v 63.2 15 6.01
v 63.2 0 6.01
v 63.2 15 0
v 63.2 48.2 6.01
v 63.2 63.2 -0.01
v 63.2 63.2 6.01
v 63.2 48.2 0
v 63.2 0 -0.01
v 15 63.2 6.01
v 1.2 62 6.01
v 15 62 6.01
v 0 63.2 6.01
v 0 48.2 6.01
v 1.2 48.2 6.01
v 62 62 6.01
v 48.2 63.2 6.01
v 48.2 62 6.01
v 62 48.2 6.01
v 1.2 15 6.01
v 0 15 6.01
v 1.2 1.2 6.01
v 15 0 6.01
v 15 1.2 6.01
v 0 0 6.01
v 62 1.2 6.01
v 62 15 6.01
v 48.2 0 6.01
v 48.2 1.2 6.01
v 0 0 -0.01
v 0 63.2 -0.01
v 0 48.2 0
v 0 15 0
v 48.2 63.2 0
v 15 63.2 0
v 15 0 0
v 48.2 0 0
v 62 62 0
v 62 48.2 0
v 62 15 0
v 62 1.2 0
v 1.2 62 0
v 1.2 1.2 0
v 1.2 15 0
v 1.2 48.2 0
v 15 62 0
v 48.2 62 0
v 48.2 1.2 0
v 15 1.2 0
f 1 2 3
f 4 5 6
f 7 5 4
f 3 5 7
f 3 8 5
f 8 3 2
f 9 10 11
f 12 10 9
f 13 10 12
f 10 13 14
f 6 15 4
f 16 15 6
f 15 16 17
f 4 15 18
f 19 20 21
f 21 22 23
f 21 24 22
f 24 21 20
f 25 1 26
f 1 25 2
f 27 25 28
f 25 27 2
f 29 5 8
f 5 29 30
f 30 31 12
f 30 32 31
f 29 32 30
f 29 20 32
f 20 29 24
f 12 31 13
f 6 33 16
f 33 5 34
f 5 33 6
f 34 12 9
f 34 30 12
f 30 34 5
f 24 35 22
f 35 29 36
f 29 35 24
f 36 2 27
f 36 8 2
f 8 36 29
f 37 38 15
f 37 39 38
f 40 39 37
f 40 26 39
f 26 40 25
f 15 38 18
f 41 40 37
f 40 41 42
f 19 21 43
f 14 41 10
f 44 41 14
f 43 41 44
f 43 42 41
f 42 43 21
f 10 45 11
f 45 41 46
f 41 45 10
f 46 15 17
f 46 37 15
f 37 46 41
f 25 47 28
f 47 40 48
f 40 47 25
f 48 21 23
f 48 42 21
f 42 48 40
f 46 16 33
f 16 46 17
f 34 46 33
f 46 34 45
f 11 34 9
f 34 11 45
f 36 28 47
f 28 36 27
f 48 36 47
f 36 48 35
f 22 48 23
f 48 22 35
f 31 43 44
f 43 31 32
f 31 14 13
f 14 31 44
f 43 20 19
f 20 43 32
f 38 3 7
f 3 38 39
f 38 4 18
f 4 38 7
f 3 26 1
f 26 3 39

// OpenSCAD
// file: ../Base/Rotation.scad
// Fischertechnik Box Foundation
// Geometry Helpers Rotation

include <PlacementOptions.scad>

// getRotatedSpace(space, rotation=NoRotation)
// Rotates the space dependent on the specified rotation

function getRotatedSpace(space, rotation=NoRotation) = [
    (rotation == Rotate90 || rotation == Rotate270) ? space.y : space.x,
    (rotation == Rotate90 || rotation == Rotate270) ? space.x : space.y
];

// Rotates the given space around the fixed left lower corner
// space = the space the children needs as width/depth list [width,depth]
// rotation = 0 Rotate0 degrees, 1 Rotate90 degrees, 2 Rotate180 degrees, 3 Rotate270 degrees (equivalent to -90)

module RotateFix(space, rotation=NoRotation) {
    dy = (rotation == Rotate0 || rotation == Rotate270) ? 0 :
        (rotation == Rotate90) ? space.x :
        space.y;
    dx = (rotation < Rotate180) ? 0 :
        (rotation == Rotate180) ? space.x :
        space.y;
    
    translate([dx, dy, 0])
        rotate([0, 0, rotations[rotation]])
            children();
}
// file: ../Base/Alignment.scad
// Fischertechnik Box Foundation
// Geometry Helpers Alignment

include <PlacementOptions.scad>

// getAlignedX(elementWidth, spaceWidth, align=AlignRight, offset=0)
// Gets the aligned X offset of an element with the given
// width in the given space.
// elementWidth = The width of the element to positon
// spaceWidth = The space where the element should be aligned
// align = 0 AlignLeft, 1 AlignCenter, 2 AlignRight
// offset = an optional offset from the aligned position. When
// aligned left or centered, then positive values are in X direction.
// When aligned right then positive values are in negative X direction.

function getAlignedX(elementWidth, spaceWidth, align=AlignRight, offset=0) =
    (align == AlignLeft) ?
        offset :
        ((align == AlignCenter) ?
        (spaceWidth - elementWidth)/2 + offset :
        spaceWidth - offset - elementWidth);

// getAlignedY(elementDepth, spaceDepth, align=AlignTop, offset=0)
// Gets the aligned Y offset of an element with the given
// depth in the given space.
// elementDepth = The depth of the element to positon
// spaceDepth = The space where the element should be aligned
// align = 0 AlignBottom, 1 AlignCenter, 2 AlignTop
// offset = an optional offset from the aligned position. When
// aligned bottom or centered, then positive values are in Y direction.
// When aligned top then positive values are in negative Y direction.

function getAlignedY(elementDepth, spaceDepth, align=AlignTop, offset=0) =
    (align == AlignBottom) ?
        offset :
        ((align == AlignCenter) ?
        (spaceDepth - elementDepth)/2 + offset :
        spaceDepth - offset - elementDepth);
// file: ../Base/Boxes.scad
// Fischertechnik Box Foundation
// Pre-designed Boxes

use <Constants.scad>

include <PlacementOptions.scad>

box190Width = 190;
box190Depth = 130;
box130Width = 130;
box130Depth = 95;

// Values are from an original ec3 box
topBottomDifference = 1.5;
outerHeight = 40;
innerHeight = 38.2;
baseThickness = outerHeight - innerHeight;
stackExcess = 5.7;
radius = 3.5;
wallThickness = 1.5;
tolerance = 0.2;
stackOffset = innerHeight - stackExcess;

boxUsageHeight = stackOffset;
boxWallThickness = wallThickness;
boxBaseThickness = baseThickness;
boxWebWidth = 3.0;

// getBoxWallThickness()
// Gets the wall thickness of a Fischertechnik Box
function getBoxWallThickness() = boxWallThickness;

// getBoxUsageHeight()
// Gets the usable height of a Fischertechnik box
function getBoxUsageHeight() = boxUsageHeight;

// getBoxInnerHeight()
// Gets the inner height of a Fischertechnik box, including the stack excess
function getBoxInnerHeight() = innerHeight;

// getBoxBaseThickness()
// Gets the thickness of the Fischertechnik box base.
function getBoxBaseThickness() = boxBaseThickness;

// getBoxWebWidth()
// Gets the width of a box web
function getBoxWebWidth() = boxWebWidth;

// getBox190Space()
// Gets the usable inner space of a Box 190 as an x/y-list
function getBox190Space() = [
    box190Width - 2*getBoxWallThickness() - topBottomDifference, 
    box190Depth - 2*getBoxWallThickness() - topBottomDifference ];

// BoxBase(width, depth)
// Creates an empty stackable Fischertechnik compatible box
// width = Outer width of the box (190, 130, ...)
// depth = Outer depth of the box (130, 95, ...)

module BoxBase(width, depth, height=outerHeight) {    
    thinPlate = 0.01;

    innerHeight = height - baseThickness;    
    
    module BodyPlate(width, depth) {
        translate([radius, radius])
        hull() {
            w = width-2*radius;
            d = depth-2*radius;
            cube([w, d, thinPlate]);
            cylinder(thinPlate, r=radius, $fn=getFragments());
            translate([w, 0])
                cylinder(thinPlate, r=radius, $fn=getFragments());
            translate([w, d])
                cylinder(thinPlate, r=radius, $fn=getFragments());
            translate([0, d])
                cylinder(thinPlate, r=radius, $fn=getFragments());
        }
    }
    
    module Body(tolerance=tolerance) {
        hull() {
            // Bottom with tolerance to fit into the original boxes when stacked
            translate([-wallThickness+tolerance, -wallThickness+tolerance, -baseThickness])
                BodyPlate(width-topBottomDifference-2*tolerance, depth-topBottomDifference-2*tolerance);
            
            // Top
            translate([-wallThickness-topBottomDifference/2, -wallThickness-topBottomDifference/2, innerHeight-thinPlate])
                BodyPlate(width, depth);
         }
    }

    module Cutoff() {
        hull() {
            coWidth = width - 2*wallThickness;
            coDepth = depth - 2*wallThickness;
            
            // Bottom
            BodyPlate(coWidth-topBottomDifference, coDepth-topBottomDifference);

            // Top
            translate([-topBottomDifference/2, -topBottomDifference/2, innerHeight+thinPlate]) 
                BodyPlate(coWidth, coDepth);
        }
    }
    
    difference() {        
        Body();
        Cutoff();
        stackOffset = innerHeight - stackExcess;
        translate([0, 0, stackOffset + baseThickness])
            Body(tolerance=0);
    }
}

// Creates the Fischertechnik empty box 130x190 mm and places it at position 0,0
// 190x130 are the outer sizes, the inner space is slightly smaller. Use getBox190Space() to get the inner sizes.
// The box is positioned that the usable inner space is at the 0,0,0 position. The

module Box190() {
    BoxBase(box190Width, box190Depth);
}

// Gets the usable inner space of a Box 130 as an x/y-list
function getBox130Space() = [
    box130Width - 2*getBoxWallThickness() - topBottomDifference, 
    box130Depth - 2*getBoxWallThickness() - topBottomDifference ];

// Creates the Fischertechnik empty box 95x130 mm and places it at position 0,0
// 190x130 are the outer sizes, the inner space is slightly smaller. Use getBox190Space() to get the inner sizes.
// The box is positioned that the usable inner space is at the 0,0,0 position. The

module Box130() {
    BoxBase(box130Width, box130Depth);
}

// Creates a web at the specified box walls
// corner 0 = LowerLeft, 1 = UpperLeft, 2 = UpperRight, 3 = LowerRight
// side 0 = LeftOfCorner, 1 = RightOfCorner
// distance = Distance in mm from the corner
// boxSpace = inner width and depth of the box (default: Box 190)
// webWidth = length of the web (default is 3 mms)
// webThickness = thickness of the web (default is 1 mm)

module BoxWeb(corner, side, distance, boxSpace=getBox190Space(), webWidth=getBoxWebWidth(), webThickness=1.0) {
    sink = getBoxWallThickness()/2;

    width = (corner % 2 == 0) ? 
            (side == LeftOfCorner ? webWidth : webThickness) :
            (side == LeftOfCorner ? webThickness : webWidth);

    depth = (corner % 2 == 0) ? 
            (side == RightOfCorner ? webWidth : webThickness) :
            (side == RightOfCorner ? webThickness : webWidth);
    
    xDiff = corner == LowerLeft ? 
                (side == LeftOfCorner ? -sink : distance) :
            (corner == UpperLeft ?                
                (side == LeftOfCorner ? distance : -sink) :
            (corner == UpperRight ?
                (side == LeftOfCorner ? boxSpace.x-webWidth+sink : boxSpace.x-distance-webThickness) :
                (side == LeftOfCorner ? boxSpace.x-distance-webThickness: boxSpace.x-webWidth+sink)));

    yDiff = corner == LowerLeft ? 
                (side == RightOfCorner ? -sink : distance) :
            (corner == UpperLeft ?
                (side == RightOfCorner ? boxSpace.y-distance : boxSpace.y-webWidth+sink) :
            (corner == UpperRight ?
                (side == RightOfCorner ? boxSpace.y-webWidth+sink : boxSpace.y-distance) :
                (side == RightOfCorner ? distance : -sink)));
    
    translate([xDiff, yDiff, -getExcess()])
        cube([width, depth, boxUsageHeight + 2*getExcess()]);
}
// file: ../Base/Placement.scad
// Fischertechnik Box Foundation
// Geometry Helpers Placement

use <Constants.scad>
use <Alignment.scad>
use <Rotation.scad>
use <Boxes.scad>

include <PlacementOptions.scad>

// Place(x=0, y=0, elementSpace=[0,0], alignX=AlignLeft, alignY=AlignBottom, rotation=Rotate0, boxSpace=getBox190Space())
// Places the child at the specified position
// y = Y-Position. This is a relative position when an X aligment is specified.
// x = X-Position. This is a relative position when an Y aligment is specified.
// elementSpace = space of the element to be placed [x,y]
// alignX = -1=NoAlign, 0 AlignLeft, 1 AlignCenter, 3 AlignRight (elementSpace and boxSpace required!)
// alignY = -1=NoAlign, 2 AlignBottom, 1 AlignCenter, 4 AlignTop (elementSpace and boxSpace required!)
// rotation = 0 Rotate0 0 degrees, 1 Rotate90 90 degrees, 
// 2 Rotate180 180 degrees, 3 Rotate270 270 degrees (equivalent to -90)
// boxSpace = Inner space of the box where the placement occurs [x,y] - default is Box 190x130 inner space

module Place(x=0, y=0, elementSpace=[0,0], 
  alignX=AlignLeft, alignY=AlignBottom, 
  rotation=NoRotation, boxSpace=getBox190Space()) {

    module Position(x, y, space, rotation=Rotate0) {
        translate([x, y, 0])
            RotateFix(space, rotation)
                children();
    }

    space = getRotatedSpace(elementSpace, rotation);
    alignedX = getAlignedX(space.x, boxSpace.x, alignX, x);
    alignedY = getAlignedY(space.y, boxSpace.y, alignY, y);
    Position(alignedX, alignedY, elementSpace, rotation)
        children();
}

// Center(space=getBox130Space(), elementSpace=[0,0])
// space = Space where the children is centered. For cylinder use centered=true and no elementSpace.
// elementSpace = space of the element to be centered [x,y]

module Center(space=getBox190Space(), elementSpace=[0,0]) {
    Place(elementSpace=elementSpace, boxSpace=space, alignX=AlignCenter, alignY=AlignCenter)
        children();
}

// CenterHorizontal(width=0, y=0, offset=0, space=getBox130Space())
// width = Width of the element to be placed.
// y = Y position of the element
// offset = Offset from the center position (negative will be left of the center)
// space = Space where the element is placed

module CenterHorizontal(width=0, y=0, offset=0, space=getBox190Space()) {
    Place(x=offset, y=y, elementSpace=[width, 0], boxSpace=space, alignX=AlignCenter)
        children(0);
}

// CenterVertical(depth=0, x=0, offset=0, space=getBox130Space())
// depth = Depth of the element to be placed.
// x = X position of the element
// offset = Offset from the center position (negative will be down of the center)
// space = Space where the element is placed

module CenterVertical(depth=0, x=0, offset=0, space=getBox190Space()) {
    Place(x=x, y=offset, elementSpace=[0, depth], boxSpace=space, alignY=AlignCenter)
        children(0);
}

// getIsVertical(align)
// True if the specified alignment needs a vertical orientation for a divider (AlignRight, AlignLeft)

function getIsVertical(align) = (align == AlignRight || align == AlignLeft);

// getIsHorizontal(align)
// True if the specified alignment needs a horizontal orientation for a divider (AlignTop, AlignBottom)

function getIsHorizontal(align) = (align == AlignTop || align == AlignBottom);
// file: ../Base/PlacementOptions.scad
// Fischertechnik Box Foundation
// Placement Options

// Alignment
NoAlign = 0;
AlignLeft = 1;
AlignBottom = 2;
AlignCenter = 3;
AlignRight = 4;
AlignTop = 5;

// Element rotation degree steps
rotations = [0, -90, -180, -270];

// Rotation
NoRotation = 0;
Rotate0 = 0;
Rotate90 = 1;
Rotate180 = 2;
Rotate270 = 3;

// Docking (seen from above)
NoDock = -1;
DockLeft = 0;
DockTop = 1;
DockRight = 2;
DockCorner = 2;
DockBottom = 3;

// Web corners
LowerLeft = 0;
UpperLeft = 1;
UpperRight = 2;
LowerRight = 3;

// Web position relative to corner
LeftOfCorner = 0;
RightOfCorner = 1;
// file: ../Base/Constants.scad
// Fischertechnik Box Foundation
// Constants

// Constant values necessary for multiple elements

// Base constants
dividerThickness = 1.2;
excess = 0.01;
fragments = 90;
tolerance = 0.8;

// Gets the thickness of a divider 
function getDividerThickness() = dividerThickness;

// Gets the excess that is used to merge walls into each other
function getExcess() = excess;

// Gets amount of fragments of a cylinder
function getFragments() = fragments;

// Gets the inner tolerance of a frame to each side
function getTolerance() = tolerance;


// Fischertechnik specific constants
axisDiameter = 4;
axisBottomDiameter = axisDiameter + 1;
axisTolerance = 0.2;
standardEdgeDistance = 2.5;
standardWebDistance = 11.5;
standardCornerLength = 15;
tubeWallFactor = 0.8;
smallPartsFrameHeight = 20;

// Gets axis diameter of Fischertechnik axis
function getAxisDiameter() = axisDiameter;

// Gets axis diameter tolerance (subtracted for element axis)
function getAxisTolerance() = axisTolerance;

// Gets the axis diameter for standing axis
function getStandAxisDiameter() = getAxisDiameter() - getAxisTolerance();

// Gets axis bottom diameter for thicker part at the bottom
function getAxisBottomDiameter() = axisBottomDiameter;

// gets the standard distance to the wall of the box for dockable frames with webs
function getStandardEdgeDistance() = standardEdgeDistance;

// gets the standard distance of each web to the corner of the dockable frame
function getStandardWebDistance() = standardWebDistance;

// gets the standard length of the corner walls of a dockable frame
function getStandardCornerLength() = standardCornerLength;

// gets the wall thickness of a tube.
function getTubeWallThickness() = tubeWallFactor * getDividerThickness();

// gets the frame height for docked small parts boxes.
function getSmallPartsFrameHeight() = smallPartsFrameHeight;
// main file
// Fischertechnik Box Library
// Frame for BT Smart Controller
// 161944

use <../Base/Constants.scad>
use <../ModelBase/Simple.scad>
use <../ModelBase/Complex.scad>

include <../Base/PlacementOptions.scad>

/* [Element Parameters] */
alignX = 0;   // [0:NoAlign, 1:AlignLeft, 3:AlignCenter, 4:AlignRight]
alignY = 0;   // [0:NoAlign, 2:AlignBottom, 3:AlignCenter, 5:AlignTop]

/* [Hidden] */
width = 60;
depth = 60;
height = 6;

// getFrameBTSmartControllerSpace(alignX, alignY)
// alignX 0=NoAlign 1=AlignLeft 3=AlignCenter 4=AlignRight 
// alignY 0=AlignNo 2=AlignBottom 3=AlignCenter 5=AlignTop
// Gets the space the frame for BT Smart Controller needs as width and depth(.x and .y as a list). 

function getFrameBTSmartControllerSpace(alignX=NoAlign, alignY=NoAlign) = 
    getDockableEdgedFrameSpace([width, depth, height], alignX, alignY);

// FrameBTSmartController(alignX, alignY)
// Frame for TBT Smart Controller.
// alignX 0=NoAlign 1=AlignLeft 3=AlignCenter 4=AlignRight 
// alignY 0=AlignNo 2=AlignBottom 3=AlignCenter 5=AlignTop

module FrameBTSmartController(alignX=NoAlign, alignY=NoAlign) {
    DockableEdgedFrame([width, depth, height], alignX, alignY);
}

// Test
color("lightgray") {
    FrameBTSmartController(alignX, alignY);
}
